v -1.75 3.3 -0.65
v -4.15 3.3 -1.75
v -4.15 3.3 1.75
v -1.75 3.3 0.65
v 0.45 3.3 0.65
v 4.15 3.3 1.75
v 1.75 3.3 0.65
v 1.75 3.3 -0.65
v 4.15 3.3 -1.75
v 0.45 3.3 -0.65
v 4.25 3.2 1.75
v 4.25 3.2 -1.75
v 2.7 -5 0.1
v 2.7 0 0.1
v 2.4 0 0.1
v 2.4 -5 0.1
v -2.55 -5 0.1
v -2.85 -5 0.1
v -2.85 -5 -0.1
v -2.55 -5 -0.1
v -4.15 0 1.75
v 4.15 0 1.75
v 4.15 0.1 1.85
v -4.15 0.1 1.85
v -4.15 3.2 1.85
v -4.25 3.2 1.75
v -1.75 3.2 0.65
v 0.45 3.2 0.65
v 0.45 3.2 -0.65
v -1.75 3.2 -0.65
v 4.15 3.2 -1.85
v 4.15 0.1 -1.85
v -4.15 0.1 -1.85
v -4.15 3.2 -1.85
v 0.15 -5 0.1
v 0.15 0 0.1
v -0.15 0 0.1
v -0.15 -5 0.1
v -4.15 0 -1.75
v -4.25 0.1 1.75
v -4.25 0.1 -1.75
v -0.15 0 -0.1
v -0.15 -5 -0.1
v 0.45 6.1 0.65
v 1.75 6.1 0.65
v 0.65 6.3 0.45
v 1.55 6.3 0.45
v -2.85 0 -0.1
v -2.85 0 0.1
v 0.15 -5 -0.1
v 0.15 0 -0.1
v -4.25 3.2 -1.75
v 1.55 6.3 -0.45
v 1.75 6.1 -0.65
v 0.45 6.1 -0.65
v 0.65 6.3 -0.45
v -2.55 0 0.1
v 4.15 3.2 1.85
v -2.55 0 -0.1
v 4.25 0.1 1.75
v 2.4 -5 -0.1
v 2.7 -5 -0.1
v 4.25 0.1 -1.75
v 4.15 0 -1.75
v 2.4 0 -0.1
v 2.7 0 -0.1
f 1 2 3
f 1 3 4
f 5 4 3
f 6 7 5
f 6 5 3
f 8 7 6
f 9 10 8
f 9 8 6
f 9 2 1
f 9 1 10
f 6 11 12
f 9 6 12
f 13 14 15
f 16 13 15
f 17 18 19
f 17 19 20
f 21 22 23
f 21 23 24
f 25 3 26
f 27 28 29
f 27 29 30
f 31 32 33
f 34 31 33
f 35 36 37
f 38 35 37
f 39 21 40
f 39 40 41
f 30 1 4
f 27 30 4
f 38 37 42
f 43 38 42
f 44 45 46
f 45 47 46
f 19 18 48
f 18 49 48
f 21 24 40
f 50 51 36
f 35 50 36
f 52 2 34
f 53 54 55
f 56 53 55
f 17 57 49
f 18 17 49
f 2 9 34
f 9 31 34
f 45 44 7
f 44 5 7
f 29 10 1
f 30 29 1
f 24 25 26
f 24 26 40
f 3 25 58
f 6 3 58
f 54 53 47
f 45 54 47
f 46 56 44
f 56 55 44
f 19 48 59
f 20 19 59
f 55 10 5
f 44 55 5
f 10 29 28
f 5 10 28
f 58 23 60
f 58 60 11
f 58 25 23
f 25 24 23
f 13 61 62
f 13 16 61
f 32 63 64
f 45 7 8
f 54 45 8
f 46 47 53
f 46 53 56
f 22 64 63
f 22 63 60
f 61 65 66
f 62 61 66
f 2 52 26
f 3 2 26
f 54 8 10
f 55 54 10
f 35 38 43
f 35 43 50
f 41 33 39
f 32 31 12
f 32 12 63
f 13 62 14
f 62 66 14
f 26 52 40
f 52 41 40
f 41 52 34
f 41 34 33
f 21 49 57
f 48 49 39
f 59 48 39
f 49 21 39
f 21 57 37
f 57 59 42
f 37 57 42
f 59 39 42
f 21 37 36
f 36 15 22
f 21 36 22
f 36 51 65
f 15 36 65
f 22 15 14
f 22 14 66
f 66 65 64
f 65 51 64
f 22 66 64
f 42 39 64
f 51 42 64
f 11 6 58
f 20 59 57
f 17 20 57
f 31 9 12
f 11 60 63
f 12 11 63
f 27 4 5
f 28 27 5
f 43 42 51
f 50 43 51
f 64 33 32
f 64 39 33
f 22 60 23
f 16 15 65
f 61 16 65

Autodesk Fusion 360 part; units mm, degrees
sketch "Sketch1" plane through (0, 0, 0) normal (0, 1, 0) x (1, 0, 0)
  line L0 (4.25, 1.85) -> (-4.25, 1.85)
  line L1 (-4.25, 1.85) -> (-4.25, -1.85)
  line L2 (-4.25, -1.85) -> (4.25, -1.85)
  line L3 (4.25, -1.85) -> (4.25, 1.85)
  line L4 (4.25, 1.85) -> (-4.25, -1.85) construction
  line L5 (-4.25, 1.85) -> (4.25, -1.85) construction
  dimension "d1" = 8.5
  dimension "d2" = 3.7
extrude "Extrude1" add sketch "Sketch1" along normal blind 3.3
sketch "Sketch2" plane through (0, 3.3, 0) normal (0, 1, 0) x (-1, 0, 0)
  line L0 (-4.25, 1.85) -> (-4.25, -1.85)
  line L1 (-4.25, -1.85) -> (4.25, -1.85)
  line L2 (4.25, -1.85) -> (4.25, 1.85)
  line L3 (4.25, 1.85) -> (-4.25, 1.85)
  line L4 (-4.25, 0) -> (-1.75, 0)
  line L5 (-1.75, 0) -> (-1.1, 0)
  line L6 (-1.75, -0.65) -> (-0.45, -0.65)
  line L7 (-0.45, -0.65) -> (-0.45, 0.65)
  line L8 (-0.45, 0.65) -> (-1.75, 0.65)
  line L9 (-1.75, 0.65) -> (-1.75, -0.65)
  line L10 (-1.75, -0.65) -> (-0.45, 0.65) construction
  line L11 (-0.45, -0.65) -> (-1.75, 0.65) construction
  line L12 (4.25, 0) -> (1.75, 0)
  line L13 (1.75, 0) -> (1.1, 0)
  line L14 (0.45, -0.65) -> (1.75, -0.65)
  line L15 (1.75, -0.65) -> (1.75, 0.65)
  line L16 (1.75, 0.65) -> (0.45, 0.65)
  line L17 (0.45, 0.65) -> (0.45, -0.65)
  line L18 (0.45, -0.65) -> (1.75, 0.65) construction
  line L19 (1.75, -0.65) -> (0.45, 0.65) construction
  line L20 (0.45, -0.65) -> (-0.45, -0.65)
  line L21 (0.45, 0.65) -> (-0.45, 0.65)
  point P0 (-1.1, 0)
  point P1 (1.1, 0)
  dimension "d5" = 2.5
  dimension "d6" = 0.65
  dimension "d7" = 1.3
  dimension "d8" = 1.3
  dimension "d9" = 2.5
  dimension "d10" = 0.65
  dimension "d11" = 1.3
  dimension "d12" = 1.3
extrude "Extrude2" cut sketch "Sketch2" against normal blind 0.1 contours L14 L15 L16 L17 | L7 L17 L20 L21
extrude "Extrude3" add sketch "Sketch2" along normal blind 3 contours L6 L7 L8 L9
chamfer "Chamfer1" distance 0.2 angle 45 4 edges at (1.1, 6.3, 0.65) (0.45, 6.3, 0) (1.1, 6.3, -0.65) (1.75, 6.3, 0)
chamfer "Chamfer2" distance 0.1 angle 45 12 edges at (0, 3.3, 1.85) (4.25, 3.3, 0) (-4.25, 3.3, 0) (0, 3.3, -1.85) (4.25, 1.65, 1.85) (4.25, 1.65, -1.85) (4.25, 0, 0) (0, 0, 1.85) (-4.25, 1.65, 1.85) (-4.25, 1.65, -1.85) (0, 0, -1.85) (-4.25, 0, 0)
sketch "Sketch3" plane through (0, 0, 0) normal (0, -1, 0) x (1, 0, 0)
  line L0 (-4.15, -1.75) -> (4.15, -1.75)
  line L1 (4.15, -1.75) -> (4.15, 1.75)
  line L2 (4.15, 1.75) -> (-4.15, 1.75)
  line L3 (-4.15, 1.75) -> (-4.15, -1.75)
  line L4 (0.15, 0.1) -> (-0.15, 0.1)
  line L5 (-0.15, 0.1) -> (-0.15, -0.1)
  line L6 (-0.15, -0.1) -> (0.15, -0.1)
  line L7 (0.15, -0.1) -> (0.15, 0.1)
  line L8 (0.15, 0.1) -> (-0.15, -0.1) construction
  line L9 (-0.15, 0.1) -> (0.15, -0.1) construction
  line L10 (0, 0) -> (2.7, 0)
  line L11 (2.7, 0) -> (2.55, 0)
  line L12 (2.7, 0.1) -> (2.4, 0.1)
  line L13 (2.4, 0.1) -> (2.4, -0.1)
  line L14 (2.4, -0.1) -> (2.7, -0.1)
  line L15 (2.7, -0.1) -> (2.7, 0.1)
  line L16 (2.7, 0.1) -> (2.4, -0.1) construction
  line L17 (2.4, 0.1) -> (2.7, -0.1) construction
  line L18 (-0.15, 0) -> (-2.85, 0)
  line L19 (-2.85, 0) -> (-2.7, 0)
  line L20 (-2.55, 0.1) -> (-2.85, 0.1)
  line L21 (-2.85, 0.1) -> (-2.85, -0.1)
  line L22 (-2.85, -0.1) -> (-2.55, -0.1)
  line L23 (-2.55, -0.1) -> (-2.55, 0.1)
  line L24 (-2.55, 0.1) -> (-2.85, -0.1) construction
  line L25 (-2.85, 0.1) -> (-2.55, -0.1) construction
  point P0 (2.55, 0)
  point P1 (-2.7, 0)
  dimension "d19" = 0.3
  dimension "d20" = 0.2
  dimension "d23" = 2.7
  dimension "d24" = 0.15
  dimension "d25" = 0.3
  dimension "d26" = 0.2
  dimension "d27" = 2.7
  dimension "d28" = 0.15
  dimension "d29" = 0.3
  dimension "d30" = 0.2
extrude "Extrude4" add sketch "Sketch3" along normal blind 5 contours L4 L5 L6 L7
extrude "Extrude5" add sketch "Sketch3" along normal blind 5 contours L18 L19 L21 L22 L23 | L18 L19 L20 L21 L23
extrude "Extrude6" add sketch "Sketch3" along normal blind 5 contours L10 L11 L12 L13 L15 | L10 L11 L13 L14 L15
